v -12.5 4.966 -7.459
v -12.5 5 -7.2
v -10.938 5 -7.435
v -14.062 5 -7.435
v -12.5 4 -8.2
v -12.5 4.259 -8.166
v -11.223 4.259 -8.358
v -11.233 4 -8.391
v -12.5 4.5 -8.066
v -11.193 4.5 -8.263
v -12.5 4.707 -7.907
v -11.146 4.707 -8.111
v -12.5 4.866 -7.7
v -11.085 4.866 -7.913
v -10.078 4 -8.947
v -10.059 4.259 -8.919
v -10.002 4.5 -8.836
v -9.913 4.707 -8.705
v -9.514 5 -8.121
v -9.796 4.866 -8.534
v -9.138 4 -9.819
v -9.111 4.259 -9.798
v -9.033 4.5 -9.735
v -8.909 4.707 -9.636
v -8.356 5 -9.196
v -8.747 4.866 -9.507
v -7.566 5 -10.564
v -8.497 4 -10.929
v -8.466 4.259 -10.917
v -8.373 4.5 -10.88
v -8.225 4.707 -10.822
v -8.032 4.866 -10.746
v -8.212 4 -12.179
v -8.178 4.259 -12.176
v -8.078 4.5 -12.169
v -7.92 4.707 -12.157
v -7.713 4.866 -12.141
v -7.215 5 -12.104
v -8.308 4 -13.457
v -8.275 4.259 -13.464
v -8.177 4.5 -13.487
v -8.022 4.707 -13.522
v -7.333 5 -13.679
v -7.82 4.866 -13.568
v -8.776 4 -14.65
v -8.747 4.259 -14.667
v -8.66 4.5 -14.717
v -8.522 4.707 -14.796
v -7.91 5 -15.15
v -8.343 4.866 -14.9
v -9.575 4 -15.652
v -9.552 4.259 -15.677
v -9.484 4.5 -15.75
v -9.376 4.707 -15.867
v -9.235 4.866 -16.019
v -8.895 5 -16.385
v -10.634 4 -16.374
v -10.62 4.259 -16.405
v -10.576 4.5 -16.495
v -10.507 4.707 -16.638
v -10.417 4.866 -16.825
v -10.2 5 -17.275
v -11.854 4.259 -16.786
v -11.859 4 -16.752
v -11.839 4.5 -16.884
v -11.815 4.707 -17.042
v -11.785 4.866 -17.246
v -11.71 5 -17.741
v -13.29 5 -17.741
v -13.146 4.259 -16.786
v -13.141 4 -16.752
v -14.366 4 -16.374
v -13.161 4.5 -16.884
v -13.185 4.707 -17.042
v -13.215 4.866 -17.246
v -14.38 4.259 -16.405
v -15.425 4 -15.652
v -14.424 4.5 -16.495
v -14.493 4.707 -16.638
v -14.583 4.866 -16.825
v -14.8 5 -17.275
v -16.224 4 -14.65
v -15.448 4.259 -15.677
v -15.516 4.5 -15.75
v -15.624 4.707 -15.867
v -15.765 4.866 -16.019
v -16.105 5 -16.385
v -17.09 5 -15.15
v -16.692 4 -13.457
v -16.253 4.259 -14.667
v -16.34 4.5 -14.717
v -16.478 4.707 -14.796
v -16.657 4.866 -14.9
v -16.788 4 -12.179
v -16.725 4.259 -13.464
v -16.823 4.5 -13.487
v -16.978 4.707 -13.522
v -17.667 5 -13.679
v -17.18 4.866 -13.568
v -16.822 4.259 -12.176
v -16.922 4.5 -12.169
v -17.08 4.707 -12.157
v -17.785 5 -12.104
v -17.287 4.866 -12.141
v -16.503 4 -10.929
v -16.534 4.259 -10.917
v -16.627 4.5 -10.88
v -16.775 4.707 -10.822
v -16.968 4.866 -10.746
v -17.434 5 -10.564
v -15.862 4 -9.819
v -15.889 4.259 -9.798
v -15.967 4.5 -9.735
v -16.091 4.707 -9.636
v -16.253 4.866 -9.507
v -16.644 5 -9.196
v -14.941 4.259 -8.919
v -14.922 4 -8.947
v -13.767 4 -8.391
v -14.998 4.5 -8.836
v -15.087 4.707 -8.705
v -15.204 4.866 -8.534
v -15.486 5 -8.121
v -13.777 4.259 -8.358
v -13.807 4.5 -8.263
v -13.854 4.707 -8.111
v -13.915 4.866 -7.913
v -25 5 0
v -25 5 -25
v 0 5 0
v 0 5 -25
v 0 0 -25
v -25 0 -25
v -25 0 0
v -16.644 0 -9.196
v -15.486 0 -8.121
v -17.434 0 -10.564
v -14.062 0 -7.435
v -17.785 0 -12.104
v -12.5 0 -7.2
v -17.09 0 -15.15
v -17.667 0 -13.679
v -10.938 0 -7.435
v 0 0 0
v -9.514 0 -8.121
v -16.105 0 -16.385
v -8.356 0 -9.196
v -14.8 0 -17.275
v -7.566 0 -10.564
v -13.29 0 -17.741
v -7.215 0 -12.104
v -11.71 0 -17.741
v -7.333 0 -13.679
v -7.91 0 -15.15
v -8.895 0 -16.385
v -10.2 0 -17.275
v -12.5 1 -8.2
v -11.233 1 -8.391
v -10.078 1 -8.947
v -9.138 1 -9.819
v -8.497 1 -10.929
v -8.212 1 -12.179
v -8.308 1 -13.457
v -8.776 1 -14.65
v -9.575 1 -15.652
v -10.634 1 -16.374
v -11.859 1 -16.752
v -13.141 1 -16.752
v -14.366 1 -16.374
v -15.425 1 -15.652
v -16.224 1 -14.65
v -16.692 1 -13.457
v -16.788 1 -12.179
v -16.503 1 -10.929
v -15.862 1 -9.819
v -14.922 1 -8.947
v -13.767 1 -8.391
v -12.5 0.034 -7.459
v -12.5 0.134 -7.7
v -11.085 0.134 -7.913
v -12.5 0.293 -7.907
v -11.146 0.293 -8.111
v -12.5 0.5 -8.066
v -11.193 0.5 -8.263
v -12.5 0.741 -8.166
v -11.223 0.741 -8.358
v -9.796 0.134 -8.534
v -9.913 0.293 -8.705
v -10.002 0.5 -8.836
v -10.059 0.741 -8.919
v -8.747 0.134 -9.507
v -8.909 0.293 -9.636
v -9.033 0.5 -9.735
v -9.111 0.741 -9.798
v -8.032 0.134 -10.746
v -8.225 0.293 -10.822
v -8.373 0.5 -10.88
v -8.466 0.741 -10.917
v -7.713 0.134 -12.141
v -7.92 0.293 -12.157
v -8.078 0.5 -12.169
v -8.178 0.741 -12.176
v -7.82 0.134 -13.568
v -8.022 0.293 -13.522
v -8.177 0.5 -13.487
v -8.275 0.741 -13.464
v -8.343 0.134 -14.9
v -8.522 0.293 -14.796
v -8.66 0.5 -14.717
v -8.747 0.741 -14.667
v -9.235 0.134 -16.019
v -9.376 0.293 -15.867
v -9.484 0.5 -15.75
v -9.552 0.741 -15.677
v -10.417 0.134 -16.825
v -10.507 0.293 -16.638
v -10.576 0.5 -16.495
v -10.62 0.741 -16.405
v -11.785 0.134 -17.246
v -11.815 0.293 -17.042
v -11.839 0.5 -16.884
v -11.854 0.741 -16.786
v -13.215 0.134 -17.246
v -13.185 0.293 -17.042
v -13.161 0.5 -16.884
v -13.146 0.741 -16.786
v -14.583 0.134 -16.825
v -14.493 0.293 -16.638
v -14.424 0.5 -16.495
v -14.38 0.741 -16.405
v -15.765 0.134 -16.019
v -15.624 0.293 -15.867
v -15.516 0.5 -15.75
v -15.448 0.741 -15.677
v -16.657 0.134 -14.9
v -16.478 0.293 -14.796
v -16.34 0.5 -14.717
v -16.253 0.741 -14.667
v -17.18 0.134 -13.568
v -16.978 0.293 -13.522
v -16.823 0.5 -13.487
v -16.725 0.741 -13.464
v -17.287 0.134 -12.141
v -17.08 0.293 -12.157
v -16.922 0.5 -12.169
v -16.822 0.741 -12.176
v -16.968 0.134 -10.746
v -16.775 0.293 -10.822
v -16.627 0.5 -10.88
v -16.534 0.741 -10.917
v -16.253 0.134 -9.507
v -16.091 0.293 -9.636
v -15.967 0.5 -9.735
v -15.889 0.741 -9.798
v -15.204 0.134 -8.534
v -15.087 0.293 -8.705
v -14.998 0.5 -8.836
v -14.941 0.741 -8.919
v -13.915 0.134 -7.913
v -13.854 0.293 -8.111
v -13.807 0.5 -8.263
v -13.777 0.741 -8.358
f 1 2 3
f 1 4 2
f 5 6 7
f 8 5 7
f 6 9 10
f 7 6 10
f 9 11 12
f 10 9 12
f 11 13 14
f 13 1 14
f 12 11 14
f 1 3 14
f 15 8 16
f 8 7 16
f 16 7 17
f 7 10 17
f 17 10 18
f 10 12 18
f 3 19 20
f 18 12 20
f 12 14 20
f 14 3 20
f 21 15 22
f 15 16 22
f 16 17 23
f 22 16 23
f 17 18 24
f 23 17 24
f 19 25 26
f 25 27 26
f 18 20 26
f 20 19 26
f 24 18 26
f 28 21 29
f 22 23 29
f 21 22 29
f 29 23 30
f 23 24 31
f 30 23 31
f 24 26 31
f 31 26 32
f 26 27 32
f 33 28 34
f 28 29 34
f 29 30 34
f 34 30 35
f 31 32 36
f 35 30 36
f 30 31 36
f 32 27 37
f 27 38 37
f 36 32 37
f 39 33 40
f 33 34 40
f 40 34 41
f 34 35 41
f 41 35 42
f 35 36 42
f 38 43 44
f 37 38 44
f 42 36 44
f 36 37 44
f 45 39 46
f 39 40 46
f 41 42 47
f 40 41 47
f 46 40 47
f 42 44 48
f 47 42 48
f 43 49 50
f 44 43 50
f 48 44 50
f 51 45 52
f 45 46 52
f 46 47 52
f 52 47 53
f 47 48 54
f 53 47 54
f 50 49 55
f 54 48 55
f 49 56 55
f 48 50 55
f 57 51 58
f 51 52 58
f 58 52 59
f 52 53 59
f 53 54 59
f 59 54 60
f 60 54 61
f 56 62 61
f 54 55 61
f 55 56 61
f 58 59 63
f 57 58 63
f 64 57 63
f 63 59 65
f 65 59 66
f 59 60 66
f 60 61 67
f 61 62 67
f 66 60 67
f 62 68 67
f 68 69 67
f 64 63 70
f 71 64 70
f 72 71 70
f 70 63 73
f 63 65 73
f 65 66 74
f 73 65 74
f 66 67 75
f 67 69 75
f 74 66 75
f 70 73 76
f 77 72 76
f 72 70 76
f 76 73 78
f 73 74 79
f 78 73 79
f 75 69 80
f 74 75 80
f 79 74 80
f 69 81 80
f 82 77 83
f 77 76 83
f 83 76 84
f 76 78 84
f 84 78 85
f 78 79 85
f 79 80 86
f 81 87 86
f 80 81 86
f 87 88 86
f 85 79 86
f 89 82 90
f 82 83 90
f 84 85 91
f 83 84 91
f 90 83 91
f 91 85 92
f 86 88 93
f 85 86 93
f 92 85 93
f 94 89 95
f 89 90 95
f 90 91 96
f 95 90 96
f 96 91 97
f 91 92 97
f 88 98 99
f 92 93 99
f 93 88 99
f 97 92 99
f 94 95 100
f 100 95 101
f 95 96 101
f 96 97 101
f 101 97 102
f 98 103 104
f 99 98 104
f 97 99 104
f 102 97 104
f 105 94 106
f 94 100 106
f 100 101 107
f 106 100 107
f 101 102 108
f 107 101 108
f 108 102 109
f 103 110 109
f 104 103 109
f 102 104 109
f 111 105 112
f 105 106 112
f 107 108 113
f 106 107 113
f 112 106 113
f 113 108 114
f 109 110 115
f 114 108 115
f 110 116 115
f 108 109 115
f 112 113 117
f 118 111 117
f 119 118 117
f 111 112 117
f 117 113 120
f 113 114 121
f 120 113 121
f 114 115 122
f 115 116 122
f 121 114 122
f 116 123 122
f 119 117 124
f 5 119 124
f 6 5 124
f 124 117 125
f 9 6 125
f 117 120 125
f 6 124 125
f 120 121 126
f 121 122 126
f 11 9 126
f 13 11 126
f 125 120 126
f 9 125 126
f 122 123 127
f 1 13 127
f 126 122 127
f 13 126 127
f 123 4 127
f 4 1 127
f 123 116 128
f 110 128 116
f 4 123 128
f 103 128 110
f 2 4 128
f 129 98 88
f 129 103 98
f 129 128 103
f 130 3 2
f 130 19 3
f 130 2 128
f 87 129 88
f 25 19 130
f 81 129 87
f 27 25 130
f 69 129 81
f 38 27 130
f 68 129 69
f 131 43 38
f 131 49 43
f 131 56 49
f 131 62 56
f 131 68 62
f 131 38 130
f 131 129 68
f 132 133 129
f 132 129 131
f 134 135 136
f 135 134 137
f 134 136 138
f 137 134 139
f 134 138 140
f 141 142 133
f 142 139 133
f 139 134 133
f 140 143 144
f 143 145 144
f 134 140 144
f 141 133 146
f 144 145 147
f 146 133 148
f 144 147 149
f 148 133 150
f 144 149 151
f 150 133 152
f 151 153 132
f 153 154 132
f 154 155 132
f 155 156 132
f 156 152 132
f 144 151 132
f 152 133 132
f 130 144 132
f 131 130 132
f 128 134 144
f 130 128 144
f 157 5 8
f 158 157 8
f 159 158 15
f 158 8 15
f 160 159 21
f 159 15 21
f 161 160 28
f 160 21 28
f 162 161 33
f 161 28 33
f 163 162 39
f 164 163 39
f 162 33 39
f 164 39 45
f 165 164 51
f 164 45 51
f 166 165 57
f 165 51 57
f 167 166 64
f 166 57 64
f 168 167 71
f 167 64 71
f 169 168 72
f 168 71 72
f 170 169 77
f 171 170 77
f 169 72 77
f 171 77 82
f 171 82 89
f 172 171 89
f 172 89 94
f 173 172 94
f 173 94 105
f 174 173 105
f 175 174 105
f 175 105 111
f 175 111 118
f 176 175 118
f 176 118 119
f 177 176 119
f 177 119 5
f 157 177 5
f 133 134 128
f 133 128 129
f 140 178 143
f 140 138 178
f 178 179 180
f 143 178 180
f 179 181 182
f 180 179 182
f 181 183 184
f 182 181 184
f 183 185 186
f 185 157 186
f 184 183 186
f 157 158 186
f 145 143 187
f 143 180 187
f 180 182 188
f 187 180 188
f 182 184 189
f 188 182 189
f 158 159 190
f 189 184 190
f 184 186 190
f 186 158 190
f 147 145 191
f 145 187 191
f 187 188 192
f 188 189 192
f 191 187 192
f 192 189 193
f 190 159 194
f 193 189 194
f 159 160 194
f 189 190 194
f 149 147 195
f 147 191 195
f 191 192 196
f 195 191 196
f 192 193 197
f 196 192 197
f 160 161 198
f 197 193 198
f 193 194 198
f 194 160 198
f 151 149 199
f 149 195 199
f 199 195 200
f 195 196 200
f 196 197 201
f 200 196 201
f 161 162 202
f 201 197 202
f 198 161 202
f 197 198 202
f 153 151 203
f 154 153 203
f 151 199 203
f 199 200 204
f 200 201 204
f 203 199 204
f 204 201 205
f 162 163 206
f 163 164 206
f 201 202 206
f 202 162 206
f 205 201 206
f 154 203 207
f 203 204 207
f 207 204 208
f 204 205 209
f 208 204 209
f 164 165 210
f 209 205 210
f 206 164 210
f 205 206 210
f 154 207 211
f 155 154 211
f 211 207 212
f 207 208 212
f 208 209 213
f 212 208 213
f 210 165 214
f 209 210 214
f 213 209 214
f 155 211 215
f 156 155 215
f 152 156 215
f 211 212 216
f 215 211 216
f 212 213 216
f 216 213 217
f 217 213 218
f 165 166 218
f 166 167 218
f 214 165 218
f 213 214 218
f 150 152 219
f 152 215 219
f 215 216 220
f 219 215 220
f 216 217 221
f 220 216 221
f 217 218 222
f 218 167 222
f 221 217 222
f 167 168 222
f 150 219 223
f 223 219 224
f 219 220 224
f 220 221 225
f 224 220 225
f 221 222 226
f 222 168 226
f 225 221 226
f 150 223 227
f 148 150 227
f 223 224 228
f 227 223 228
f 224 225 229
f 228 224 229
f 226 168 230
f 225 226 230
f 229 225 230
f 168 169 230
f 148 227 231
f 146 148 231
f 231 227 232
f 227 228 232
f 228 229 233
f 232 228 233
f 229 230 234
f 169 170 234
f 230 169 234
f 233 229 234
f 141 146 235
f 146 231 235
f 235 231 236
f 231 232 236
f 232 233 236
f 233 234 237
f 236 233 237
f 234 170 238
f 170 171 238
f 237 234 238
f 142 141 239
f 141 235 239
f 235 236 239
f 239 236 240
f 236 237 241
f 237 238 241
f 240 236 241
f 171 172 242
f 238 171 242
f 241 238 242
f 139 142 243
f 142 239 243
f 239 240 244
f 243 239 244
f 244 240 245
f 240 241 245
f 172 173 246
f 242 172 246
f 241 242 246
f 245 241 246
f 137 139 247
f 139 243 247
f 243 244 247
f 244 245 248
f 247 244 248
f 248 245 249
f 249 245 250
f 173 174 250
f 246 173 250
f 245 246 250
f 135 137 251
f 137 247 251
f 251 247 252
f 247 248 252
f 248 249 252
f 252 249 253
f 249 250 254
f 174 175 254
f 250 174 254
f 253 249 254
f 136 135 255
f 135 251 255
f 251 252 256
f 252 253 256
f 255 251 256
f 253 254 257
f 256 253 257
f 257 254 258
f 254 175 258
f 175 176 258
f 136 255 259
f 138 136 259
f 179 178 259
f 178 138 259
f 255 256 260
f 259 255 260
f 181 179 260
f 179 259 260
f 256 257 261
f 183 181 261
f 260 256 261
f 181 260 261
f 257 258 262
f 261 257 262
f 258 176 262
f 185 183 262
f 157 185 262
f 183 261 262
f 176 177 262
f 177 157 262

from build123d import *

# Parameters (mm, degrees)
ESQUISSE1_W             = 25
ESQUISSE1_H             = 25
BOSS_EXTRU_1_DEPTH      = 5
ENL_V_MAT_EXTRU_1_REACH = 37.707
ESQUISSE2_R             = 4.3
CONG_2_R                = 1
CONG_3_R                = 1


with BuildPart() as part:
    # Esquisse1 → Boss.-Extru.1 (new body)
    with BuildSketch(Plane(origin=(0, 0, 0), x_dir=(1, 0, 0), z_dir=(0, 1, 0))):
        with Locations((-12.5, 12.5)):
            Rectangle(ESQUISSE1_W, ESQUISSE1_H)
    extrude(amount=BOSS_EXTRU_1_DEPTH)

    # Esquisse2 → Enlèv. mat.-Extru.1 (cut, up to next)
    with BuildSketch(Plane(origin=(0, 5, 0), x_dir=(1, 0, 0), z_dir=(0, 1, 0)), mode=Mode.PRIVATE) as enl_v_mat_extru_1_sk1:
        with Locations(Location((-12.5, 12.5, 0), (0, 0, 270))):
            Circle(ESQUISSE2_R)
    enl_v_mat_extru_1_tool1 = extrude(enl_v_mat_extru_1_sk1.sketch, amount=-ENL_V_MAT_EXTRU_1_REACH, mode=Mode.PRIVATE) & part.part
    add(enl_v_mat_extru_1_tool1.solids().sort_by_distance((-12.5, 5, -12.5))[0], mode=Mode.SUBTRACT)

    # Congé2
    cong_2_edges = [part.edges().sort_by_distance(p)[0] for p in [
        (-12.5, 0, -16.8),
    ]]
    fillet(cong_2_edges, radius=CONG_2_R)

    # Congé3
    cong_3_edges = [part.edges().sort_by_distance(p)[0] for p in [
        (-12.5, 5, -16.8),
    ]]
    fillet(cong_3_edges, radius=CONG_3_R)


solid = part.part
